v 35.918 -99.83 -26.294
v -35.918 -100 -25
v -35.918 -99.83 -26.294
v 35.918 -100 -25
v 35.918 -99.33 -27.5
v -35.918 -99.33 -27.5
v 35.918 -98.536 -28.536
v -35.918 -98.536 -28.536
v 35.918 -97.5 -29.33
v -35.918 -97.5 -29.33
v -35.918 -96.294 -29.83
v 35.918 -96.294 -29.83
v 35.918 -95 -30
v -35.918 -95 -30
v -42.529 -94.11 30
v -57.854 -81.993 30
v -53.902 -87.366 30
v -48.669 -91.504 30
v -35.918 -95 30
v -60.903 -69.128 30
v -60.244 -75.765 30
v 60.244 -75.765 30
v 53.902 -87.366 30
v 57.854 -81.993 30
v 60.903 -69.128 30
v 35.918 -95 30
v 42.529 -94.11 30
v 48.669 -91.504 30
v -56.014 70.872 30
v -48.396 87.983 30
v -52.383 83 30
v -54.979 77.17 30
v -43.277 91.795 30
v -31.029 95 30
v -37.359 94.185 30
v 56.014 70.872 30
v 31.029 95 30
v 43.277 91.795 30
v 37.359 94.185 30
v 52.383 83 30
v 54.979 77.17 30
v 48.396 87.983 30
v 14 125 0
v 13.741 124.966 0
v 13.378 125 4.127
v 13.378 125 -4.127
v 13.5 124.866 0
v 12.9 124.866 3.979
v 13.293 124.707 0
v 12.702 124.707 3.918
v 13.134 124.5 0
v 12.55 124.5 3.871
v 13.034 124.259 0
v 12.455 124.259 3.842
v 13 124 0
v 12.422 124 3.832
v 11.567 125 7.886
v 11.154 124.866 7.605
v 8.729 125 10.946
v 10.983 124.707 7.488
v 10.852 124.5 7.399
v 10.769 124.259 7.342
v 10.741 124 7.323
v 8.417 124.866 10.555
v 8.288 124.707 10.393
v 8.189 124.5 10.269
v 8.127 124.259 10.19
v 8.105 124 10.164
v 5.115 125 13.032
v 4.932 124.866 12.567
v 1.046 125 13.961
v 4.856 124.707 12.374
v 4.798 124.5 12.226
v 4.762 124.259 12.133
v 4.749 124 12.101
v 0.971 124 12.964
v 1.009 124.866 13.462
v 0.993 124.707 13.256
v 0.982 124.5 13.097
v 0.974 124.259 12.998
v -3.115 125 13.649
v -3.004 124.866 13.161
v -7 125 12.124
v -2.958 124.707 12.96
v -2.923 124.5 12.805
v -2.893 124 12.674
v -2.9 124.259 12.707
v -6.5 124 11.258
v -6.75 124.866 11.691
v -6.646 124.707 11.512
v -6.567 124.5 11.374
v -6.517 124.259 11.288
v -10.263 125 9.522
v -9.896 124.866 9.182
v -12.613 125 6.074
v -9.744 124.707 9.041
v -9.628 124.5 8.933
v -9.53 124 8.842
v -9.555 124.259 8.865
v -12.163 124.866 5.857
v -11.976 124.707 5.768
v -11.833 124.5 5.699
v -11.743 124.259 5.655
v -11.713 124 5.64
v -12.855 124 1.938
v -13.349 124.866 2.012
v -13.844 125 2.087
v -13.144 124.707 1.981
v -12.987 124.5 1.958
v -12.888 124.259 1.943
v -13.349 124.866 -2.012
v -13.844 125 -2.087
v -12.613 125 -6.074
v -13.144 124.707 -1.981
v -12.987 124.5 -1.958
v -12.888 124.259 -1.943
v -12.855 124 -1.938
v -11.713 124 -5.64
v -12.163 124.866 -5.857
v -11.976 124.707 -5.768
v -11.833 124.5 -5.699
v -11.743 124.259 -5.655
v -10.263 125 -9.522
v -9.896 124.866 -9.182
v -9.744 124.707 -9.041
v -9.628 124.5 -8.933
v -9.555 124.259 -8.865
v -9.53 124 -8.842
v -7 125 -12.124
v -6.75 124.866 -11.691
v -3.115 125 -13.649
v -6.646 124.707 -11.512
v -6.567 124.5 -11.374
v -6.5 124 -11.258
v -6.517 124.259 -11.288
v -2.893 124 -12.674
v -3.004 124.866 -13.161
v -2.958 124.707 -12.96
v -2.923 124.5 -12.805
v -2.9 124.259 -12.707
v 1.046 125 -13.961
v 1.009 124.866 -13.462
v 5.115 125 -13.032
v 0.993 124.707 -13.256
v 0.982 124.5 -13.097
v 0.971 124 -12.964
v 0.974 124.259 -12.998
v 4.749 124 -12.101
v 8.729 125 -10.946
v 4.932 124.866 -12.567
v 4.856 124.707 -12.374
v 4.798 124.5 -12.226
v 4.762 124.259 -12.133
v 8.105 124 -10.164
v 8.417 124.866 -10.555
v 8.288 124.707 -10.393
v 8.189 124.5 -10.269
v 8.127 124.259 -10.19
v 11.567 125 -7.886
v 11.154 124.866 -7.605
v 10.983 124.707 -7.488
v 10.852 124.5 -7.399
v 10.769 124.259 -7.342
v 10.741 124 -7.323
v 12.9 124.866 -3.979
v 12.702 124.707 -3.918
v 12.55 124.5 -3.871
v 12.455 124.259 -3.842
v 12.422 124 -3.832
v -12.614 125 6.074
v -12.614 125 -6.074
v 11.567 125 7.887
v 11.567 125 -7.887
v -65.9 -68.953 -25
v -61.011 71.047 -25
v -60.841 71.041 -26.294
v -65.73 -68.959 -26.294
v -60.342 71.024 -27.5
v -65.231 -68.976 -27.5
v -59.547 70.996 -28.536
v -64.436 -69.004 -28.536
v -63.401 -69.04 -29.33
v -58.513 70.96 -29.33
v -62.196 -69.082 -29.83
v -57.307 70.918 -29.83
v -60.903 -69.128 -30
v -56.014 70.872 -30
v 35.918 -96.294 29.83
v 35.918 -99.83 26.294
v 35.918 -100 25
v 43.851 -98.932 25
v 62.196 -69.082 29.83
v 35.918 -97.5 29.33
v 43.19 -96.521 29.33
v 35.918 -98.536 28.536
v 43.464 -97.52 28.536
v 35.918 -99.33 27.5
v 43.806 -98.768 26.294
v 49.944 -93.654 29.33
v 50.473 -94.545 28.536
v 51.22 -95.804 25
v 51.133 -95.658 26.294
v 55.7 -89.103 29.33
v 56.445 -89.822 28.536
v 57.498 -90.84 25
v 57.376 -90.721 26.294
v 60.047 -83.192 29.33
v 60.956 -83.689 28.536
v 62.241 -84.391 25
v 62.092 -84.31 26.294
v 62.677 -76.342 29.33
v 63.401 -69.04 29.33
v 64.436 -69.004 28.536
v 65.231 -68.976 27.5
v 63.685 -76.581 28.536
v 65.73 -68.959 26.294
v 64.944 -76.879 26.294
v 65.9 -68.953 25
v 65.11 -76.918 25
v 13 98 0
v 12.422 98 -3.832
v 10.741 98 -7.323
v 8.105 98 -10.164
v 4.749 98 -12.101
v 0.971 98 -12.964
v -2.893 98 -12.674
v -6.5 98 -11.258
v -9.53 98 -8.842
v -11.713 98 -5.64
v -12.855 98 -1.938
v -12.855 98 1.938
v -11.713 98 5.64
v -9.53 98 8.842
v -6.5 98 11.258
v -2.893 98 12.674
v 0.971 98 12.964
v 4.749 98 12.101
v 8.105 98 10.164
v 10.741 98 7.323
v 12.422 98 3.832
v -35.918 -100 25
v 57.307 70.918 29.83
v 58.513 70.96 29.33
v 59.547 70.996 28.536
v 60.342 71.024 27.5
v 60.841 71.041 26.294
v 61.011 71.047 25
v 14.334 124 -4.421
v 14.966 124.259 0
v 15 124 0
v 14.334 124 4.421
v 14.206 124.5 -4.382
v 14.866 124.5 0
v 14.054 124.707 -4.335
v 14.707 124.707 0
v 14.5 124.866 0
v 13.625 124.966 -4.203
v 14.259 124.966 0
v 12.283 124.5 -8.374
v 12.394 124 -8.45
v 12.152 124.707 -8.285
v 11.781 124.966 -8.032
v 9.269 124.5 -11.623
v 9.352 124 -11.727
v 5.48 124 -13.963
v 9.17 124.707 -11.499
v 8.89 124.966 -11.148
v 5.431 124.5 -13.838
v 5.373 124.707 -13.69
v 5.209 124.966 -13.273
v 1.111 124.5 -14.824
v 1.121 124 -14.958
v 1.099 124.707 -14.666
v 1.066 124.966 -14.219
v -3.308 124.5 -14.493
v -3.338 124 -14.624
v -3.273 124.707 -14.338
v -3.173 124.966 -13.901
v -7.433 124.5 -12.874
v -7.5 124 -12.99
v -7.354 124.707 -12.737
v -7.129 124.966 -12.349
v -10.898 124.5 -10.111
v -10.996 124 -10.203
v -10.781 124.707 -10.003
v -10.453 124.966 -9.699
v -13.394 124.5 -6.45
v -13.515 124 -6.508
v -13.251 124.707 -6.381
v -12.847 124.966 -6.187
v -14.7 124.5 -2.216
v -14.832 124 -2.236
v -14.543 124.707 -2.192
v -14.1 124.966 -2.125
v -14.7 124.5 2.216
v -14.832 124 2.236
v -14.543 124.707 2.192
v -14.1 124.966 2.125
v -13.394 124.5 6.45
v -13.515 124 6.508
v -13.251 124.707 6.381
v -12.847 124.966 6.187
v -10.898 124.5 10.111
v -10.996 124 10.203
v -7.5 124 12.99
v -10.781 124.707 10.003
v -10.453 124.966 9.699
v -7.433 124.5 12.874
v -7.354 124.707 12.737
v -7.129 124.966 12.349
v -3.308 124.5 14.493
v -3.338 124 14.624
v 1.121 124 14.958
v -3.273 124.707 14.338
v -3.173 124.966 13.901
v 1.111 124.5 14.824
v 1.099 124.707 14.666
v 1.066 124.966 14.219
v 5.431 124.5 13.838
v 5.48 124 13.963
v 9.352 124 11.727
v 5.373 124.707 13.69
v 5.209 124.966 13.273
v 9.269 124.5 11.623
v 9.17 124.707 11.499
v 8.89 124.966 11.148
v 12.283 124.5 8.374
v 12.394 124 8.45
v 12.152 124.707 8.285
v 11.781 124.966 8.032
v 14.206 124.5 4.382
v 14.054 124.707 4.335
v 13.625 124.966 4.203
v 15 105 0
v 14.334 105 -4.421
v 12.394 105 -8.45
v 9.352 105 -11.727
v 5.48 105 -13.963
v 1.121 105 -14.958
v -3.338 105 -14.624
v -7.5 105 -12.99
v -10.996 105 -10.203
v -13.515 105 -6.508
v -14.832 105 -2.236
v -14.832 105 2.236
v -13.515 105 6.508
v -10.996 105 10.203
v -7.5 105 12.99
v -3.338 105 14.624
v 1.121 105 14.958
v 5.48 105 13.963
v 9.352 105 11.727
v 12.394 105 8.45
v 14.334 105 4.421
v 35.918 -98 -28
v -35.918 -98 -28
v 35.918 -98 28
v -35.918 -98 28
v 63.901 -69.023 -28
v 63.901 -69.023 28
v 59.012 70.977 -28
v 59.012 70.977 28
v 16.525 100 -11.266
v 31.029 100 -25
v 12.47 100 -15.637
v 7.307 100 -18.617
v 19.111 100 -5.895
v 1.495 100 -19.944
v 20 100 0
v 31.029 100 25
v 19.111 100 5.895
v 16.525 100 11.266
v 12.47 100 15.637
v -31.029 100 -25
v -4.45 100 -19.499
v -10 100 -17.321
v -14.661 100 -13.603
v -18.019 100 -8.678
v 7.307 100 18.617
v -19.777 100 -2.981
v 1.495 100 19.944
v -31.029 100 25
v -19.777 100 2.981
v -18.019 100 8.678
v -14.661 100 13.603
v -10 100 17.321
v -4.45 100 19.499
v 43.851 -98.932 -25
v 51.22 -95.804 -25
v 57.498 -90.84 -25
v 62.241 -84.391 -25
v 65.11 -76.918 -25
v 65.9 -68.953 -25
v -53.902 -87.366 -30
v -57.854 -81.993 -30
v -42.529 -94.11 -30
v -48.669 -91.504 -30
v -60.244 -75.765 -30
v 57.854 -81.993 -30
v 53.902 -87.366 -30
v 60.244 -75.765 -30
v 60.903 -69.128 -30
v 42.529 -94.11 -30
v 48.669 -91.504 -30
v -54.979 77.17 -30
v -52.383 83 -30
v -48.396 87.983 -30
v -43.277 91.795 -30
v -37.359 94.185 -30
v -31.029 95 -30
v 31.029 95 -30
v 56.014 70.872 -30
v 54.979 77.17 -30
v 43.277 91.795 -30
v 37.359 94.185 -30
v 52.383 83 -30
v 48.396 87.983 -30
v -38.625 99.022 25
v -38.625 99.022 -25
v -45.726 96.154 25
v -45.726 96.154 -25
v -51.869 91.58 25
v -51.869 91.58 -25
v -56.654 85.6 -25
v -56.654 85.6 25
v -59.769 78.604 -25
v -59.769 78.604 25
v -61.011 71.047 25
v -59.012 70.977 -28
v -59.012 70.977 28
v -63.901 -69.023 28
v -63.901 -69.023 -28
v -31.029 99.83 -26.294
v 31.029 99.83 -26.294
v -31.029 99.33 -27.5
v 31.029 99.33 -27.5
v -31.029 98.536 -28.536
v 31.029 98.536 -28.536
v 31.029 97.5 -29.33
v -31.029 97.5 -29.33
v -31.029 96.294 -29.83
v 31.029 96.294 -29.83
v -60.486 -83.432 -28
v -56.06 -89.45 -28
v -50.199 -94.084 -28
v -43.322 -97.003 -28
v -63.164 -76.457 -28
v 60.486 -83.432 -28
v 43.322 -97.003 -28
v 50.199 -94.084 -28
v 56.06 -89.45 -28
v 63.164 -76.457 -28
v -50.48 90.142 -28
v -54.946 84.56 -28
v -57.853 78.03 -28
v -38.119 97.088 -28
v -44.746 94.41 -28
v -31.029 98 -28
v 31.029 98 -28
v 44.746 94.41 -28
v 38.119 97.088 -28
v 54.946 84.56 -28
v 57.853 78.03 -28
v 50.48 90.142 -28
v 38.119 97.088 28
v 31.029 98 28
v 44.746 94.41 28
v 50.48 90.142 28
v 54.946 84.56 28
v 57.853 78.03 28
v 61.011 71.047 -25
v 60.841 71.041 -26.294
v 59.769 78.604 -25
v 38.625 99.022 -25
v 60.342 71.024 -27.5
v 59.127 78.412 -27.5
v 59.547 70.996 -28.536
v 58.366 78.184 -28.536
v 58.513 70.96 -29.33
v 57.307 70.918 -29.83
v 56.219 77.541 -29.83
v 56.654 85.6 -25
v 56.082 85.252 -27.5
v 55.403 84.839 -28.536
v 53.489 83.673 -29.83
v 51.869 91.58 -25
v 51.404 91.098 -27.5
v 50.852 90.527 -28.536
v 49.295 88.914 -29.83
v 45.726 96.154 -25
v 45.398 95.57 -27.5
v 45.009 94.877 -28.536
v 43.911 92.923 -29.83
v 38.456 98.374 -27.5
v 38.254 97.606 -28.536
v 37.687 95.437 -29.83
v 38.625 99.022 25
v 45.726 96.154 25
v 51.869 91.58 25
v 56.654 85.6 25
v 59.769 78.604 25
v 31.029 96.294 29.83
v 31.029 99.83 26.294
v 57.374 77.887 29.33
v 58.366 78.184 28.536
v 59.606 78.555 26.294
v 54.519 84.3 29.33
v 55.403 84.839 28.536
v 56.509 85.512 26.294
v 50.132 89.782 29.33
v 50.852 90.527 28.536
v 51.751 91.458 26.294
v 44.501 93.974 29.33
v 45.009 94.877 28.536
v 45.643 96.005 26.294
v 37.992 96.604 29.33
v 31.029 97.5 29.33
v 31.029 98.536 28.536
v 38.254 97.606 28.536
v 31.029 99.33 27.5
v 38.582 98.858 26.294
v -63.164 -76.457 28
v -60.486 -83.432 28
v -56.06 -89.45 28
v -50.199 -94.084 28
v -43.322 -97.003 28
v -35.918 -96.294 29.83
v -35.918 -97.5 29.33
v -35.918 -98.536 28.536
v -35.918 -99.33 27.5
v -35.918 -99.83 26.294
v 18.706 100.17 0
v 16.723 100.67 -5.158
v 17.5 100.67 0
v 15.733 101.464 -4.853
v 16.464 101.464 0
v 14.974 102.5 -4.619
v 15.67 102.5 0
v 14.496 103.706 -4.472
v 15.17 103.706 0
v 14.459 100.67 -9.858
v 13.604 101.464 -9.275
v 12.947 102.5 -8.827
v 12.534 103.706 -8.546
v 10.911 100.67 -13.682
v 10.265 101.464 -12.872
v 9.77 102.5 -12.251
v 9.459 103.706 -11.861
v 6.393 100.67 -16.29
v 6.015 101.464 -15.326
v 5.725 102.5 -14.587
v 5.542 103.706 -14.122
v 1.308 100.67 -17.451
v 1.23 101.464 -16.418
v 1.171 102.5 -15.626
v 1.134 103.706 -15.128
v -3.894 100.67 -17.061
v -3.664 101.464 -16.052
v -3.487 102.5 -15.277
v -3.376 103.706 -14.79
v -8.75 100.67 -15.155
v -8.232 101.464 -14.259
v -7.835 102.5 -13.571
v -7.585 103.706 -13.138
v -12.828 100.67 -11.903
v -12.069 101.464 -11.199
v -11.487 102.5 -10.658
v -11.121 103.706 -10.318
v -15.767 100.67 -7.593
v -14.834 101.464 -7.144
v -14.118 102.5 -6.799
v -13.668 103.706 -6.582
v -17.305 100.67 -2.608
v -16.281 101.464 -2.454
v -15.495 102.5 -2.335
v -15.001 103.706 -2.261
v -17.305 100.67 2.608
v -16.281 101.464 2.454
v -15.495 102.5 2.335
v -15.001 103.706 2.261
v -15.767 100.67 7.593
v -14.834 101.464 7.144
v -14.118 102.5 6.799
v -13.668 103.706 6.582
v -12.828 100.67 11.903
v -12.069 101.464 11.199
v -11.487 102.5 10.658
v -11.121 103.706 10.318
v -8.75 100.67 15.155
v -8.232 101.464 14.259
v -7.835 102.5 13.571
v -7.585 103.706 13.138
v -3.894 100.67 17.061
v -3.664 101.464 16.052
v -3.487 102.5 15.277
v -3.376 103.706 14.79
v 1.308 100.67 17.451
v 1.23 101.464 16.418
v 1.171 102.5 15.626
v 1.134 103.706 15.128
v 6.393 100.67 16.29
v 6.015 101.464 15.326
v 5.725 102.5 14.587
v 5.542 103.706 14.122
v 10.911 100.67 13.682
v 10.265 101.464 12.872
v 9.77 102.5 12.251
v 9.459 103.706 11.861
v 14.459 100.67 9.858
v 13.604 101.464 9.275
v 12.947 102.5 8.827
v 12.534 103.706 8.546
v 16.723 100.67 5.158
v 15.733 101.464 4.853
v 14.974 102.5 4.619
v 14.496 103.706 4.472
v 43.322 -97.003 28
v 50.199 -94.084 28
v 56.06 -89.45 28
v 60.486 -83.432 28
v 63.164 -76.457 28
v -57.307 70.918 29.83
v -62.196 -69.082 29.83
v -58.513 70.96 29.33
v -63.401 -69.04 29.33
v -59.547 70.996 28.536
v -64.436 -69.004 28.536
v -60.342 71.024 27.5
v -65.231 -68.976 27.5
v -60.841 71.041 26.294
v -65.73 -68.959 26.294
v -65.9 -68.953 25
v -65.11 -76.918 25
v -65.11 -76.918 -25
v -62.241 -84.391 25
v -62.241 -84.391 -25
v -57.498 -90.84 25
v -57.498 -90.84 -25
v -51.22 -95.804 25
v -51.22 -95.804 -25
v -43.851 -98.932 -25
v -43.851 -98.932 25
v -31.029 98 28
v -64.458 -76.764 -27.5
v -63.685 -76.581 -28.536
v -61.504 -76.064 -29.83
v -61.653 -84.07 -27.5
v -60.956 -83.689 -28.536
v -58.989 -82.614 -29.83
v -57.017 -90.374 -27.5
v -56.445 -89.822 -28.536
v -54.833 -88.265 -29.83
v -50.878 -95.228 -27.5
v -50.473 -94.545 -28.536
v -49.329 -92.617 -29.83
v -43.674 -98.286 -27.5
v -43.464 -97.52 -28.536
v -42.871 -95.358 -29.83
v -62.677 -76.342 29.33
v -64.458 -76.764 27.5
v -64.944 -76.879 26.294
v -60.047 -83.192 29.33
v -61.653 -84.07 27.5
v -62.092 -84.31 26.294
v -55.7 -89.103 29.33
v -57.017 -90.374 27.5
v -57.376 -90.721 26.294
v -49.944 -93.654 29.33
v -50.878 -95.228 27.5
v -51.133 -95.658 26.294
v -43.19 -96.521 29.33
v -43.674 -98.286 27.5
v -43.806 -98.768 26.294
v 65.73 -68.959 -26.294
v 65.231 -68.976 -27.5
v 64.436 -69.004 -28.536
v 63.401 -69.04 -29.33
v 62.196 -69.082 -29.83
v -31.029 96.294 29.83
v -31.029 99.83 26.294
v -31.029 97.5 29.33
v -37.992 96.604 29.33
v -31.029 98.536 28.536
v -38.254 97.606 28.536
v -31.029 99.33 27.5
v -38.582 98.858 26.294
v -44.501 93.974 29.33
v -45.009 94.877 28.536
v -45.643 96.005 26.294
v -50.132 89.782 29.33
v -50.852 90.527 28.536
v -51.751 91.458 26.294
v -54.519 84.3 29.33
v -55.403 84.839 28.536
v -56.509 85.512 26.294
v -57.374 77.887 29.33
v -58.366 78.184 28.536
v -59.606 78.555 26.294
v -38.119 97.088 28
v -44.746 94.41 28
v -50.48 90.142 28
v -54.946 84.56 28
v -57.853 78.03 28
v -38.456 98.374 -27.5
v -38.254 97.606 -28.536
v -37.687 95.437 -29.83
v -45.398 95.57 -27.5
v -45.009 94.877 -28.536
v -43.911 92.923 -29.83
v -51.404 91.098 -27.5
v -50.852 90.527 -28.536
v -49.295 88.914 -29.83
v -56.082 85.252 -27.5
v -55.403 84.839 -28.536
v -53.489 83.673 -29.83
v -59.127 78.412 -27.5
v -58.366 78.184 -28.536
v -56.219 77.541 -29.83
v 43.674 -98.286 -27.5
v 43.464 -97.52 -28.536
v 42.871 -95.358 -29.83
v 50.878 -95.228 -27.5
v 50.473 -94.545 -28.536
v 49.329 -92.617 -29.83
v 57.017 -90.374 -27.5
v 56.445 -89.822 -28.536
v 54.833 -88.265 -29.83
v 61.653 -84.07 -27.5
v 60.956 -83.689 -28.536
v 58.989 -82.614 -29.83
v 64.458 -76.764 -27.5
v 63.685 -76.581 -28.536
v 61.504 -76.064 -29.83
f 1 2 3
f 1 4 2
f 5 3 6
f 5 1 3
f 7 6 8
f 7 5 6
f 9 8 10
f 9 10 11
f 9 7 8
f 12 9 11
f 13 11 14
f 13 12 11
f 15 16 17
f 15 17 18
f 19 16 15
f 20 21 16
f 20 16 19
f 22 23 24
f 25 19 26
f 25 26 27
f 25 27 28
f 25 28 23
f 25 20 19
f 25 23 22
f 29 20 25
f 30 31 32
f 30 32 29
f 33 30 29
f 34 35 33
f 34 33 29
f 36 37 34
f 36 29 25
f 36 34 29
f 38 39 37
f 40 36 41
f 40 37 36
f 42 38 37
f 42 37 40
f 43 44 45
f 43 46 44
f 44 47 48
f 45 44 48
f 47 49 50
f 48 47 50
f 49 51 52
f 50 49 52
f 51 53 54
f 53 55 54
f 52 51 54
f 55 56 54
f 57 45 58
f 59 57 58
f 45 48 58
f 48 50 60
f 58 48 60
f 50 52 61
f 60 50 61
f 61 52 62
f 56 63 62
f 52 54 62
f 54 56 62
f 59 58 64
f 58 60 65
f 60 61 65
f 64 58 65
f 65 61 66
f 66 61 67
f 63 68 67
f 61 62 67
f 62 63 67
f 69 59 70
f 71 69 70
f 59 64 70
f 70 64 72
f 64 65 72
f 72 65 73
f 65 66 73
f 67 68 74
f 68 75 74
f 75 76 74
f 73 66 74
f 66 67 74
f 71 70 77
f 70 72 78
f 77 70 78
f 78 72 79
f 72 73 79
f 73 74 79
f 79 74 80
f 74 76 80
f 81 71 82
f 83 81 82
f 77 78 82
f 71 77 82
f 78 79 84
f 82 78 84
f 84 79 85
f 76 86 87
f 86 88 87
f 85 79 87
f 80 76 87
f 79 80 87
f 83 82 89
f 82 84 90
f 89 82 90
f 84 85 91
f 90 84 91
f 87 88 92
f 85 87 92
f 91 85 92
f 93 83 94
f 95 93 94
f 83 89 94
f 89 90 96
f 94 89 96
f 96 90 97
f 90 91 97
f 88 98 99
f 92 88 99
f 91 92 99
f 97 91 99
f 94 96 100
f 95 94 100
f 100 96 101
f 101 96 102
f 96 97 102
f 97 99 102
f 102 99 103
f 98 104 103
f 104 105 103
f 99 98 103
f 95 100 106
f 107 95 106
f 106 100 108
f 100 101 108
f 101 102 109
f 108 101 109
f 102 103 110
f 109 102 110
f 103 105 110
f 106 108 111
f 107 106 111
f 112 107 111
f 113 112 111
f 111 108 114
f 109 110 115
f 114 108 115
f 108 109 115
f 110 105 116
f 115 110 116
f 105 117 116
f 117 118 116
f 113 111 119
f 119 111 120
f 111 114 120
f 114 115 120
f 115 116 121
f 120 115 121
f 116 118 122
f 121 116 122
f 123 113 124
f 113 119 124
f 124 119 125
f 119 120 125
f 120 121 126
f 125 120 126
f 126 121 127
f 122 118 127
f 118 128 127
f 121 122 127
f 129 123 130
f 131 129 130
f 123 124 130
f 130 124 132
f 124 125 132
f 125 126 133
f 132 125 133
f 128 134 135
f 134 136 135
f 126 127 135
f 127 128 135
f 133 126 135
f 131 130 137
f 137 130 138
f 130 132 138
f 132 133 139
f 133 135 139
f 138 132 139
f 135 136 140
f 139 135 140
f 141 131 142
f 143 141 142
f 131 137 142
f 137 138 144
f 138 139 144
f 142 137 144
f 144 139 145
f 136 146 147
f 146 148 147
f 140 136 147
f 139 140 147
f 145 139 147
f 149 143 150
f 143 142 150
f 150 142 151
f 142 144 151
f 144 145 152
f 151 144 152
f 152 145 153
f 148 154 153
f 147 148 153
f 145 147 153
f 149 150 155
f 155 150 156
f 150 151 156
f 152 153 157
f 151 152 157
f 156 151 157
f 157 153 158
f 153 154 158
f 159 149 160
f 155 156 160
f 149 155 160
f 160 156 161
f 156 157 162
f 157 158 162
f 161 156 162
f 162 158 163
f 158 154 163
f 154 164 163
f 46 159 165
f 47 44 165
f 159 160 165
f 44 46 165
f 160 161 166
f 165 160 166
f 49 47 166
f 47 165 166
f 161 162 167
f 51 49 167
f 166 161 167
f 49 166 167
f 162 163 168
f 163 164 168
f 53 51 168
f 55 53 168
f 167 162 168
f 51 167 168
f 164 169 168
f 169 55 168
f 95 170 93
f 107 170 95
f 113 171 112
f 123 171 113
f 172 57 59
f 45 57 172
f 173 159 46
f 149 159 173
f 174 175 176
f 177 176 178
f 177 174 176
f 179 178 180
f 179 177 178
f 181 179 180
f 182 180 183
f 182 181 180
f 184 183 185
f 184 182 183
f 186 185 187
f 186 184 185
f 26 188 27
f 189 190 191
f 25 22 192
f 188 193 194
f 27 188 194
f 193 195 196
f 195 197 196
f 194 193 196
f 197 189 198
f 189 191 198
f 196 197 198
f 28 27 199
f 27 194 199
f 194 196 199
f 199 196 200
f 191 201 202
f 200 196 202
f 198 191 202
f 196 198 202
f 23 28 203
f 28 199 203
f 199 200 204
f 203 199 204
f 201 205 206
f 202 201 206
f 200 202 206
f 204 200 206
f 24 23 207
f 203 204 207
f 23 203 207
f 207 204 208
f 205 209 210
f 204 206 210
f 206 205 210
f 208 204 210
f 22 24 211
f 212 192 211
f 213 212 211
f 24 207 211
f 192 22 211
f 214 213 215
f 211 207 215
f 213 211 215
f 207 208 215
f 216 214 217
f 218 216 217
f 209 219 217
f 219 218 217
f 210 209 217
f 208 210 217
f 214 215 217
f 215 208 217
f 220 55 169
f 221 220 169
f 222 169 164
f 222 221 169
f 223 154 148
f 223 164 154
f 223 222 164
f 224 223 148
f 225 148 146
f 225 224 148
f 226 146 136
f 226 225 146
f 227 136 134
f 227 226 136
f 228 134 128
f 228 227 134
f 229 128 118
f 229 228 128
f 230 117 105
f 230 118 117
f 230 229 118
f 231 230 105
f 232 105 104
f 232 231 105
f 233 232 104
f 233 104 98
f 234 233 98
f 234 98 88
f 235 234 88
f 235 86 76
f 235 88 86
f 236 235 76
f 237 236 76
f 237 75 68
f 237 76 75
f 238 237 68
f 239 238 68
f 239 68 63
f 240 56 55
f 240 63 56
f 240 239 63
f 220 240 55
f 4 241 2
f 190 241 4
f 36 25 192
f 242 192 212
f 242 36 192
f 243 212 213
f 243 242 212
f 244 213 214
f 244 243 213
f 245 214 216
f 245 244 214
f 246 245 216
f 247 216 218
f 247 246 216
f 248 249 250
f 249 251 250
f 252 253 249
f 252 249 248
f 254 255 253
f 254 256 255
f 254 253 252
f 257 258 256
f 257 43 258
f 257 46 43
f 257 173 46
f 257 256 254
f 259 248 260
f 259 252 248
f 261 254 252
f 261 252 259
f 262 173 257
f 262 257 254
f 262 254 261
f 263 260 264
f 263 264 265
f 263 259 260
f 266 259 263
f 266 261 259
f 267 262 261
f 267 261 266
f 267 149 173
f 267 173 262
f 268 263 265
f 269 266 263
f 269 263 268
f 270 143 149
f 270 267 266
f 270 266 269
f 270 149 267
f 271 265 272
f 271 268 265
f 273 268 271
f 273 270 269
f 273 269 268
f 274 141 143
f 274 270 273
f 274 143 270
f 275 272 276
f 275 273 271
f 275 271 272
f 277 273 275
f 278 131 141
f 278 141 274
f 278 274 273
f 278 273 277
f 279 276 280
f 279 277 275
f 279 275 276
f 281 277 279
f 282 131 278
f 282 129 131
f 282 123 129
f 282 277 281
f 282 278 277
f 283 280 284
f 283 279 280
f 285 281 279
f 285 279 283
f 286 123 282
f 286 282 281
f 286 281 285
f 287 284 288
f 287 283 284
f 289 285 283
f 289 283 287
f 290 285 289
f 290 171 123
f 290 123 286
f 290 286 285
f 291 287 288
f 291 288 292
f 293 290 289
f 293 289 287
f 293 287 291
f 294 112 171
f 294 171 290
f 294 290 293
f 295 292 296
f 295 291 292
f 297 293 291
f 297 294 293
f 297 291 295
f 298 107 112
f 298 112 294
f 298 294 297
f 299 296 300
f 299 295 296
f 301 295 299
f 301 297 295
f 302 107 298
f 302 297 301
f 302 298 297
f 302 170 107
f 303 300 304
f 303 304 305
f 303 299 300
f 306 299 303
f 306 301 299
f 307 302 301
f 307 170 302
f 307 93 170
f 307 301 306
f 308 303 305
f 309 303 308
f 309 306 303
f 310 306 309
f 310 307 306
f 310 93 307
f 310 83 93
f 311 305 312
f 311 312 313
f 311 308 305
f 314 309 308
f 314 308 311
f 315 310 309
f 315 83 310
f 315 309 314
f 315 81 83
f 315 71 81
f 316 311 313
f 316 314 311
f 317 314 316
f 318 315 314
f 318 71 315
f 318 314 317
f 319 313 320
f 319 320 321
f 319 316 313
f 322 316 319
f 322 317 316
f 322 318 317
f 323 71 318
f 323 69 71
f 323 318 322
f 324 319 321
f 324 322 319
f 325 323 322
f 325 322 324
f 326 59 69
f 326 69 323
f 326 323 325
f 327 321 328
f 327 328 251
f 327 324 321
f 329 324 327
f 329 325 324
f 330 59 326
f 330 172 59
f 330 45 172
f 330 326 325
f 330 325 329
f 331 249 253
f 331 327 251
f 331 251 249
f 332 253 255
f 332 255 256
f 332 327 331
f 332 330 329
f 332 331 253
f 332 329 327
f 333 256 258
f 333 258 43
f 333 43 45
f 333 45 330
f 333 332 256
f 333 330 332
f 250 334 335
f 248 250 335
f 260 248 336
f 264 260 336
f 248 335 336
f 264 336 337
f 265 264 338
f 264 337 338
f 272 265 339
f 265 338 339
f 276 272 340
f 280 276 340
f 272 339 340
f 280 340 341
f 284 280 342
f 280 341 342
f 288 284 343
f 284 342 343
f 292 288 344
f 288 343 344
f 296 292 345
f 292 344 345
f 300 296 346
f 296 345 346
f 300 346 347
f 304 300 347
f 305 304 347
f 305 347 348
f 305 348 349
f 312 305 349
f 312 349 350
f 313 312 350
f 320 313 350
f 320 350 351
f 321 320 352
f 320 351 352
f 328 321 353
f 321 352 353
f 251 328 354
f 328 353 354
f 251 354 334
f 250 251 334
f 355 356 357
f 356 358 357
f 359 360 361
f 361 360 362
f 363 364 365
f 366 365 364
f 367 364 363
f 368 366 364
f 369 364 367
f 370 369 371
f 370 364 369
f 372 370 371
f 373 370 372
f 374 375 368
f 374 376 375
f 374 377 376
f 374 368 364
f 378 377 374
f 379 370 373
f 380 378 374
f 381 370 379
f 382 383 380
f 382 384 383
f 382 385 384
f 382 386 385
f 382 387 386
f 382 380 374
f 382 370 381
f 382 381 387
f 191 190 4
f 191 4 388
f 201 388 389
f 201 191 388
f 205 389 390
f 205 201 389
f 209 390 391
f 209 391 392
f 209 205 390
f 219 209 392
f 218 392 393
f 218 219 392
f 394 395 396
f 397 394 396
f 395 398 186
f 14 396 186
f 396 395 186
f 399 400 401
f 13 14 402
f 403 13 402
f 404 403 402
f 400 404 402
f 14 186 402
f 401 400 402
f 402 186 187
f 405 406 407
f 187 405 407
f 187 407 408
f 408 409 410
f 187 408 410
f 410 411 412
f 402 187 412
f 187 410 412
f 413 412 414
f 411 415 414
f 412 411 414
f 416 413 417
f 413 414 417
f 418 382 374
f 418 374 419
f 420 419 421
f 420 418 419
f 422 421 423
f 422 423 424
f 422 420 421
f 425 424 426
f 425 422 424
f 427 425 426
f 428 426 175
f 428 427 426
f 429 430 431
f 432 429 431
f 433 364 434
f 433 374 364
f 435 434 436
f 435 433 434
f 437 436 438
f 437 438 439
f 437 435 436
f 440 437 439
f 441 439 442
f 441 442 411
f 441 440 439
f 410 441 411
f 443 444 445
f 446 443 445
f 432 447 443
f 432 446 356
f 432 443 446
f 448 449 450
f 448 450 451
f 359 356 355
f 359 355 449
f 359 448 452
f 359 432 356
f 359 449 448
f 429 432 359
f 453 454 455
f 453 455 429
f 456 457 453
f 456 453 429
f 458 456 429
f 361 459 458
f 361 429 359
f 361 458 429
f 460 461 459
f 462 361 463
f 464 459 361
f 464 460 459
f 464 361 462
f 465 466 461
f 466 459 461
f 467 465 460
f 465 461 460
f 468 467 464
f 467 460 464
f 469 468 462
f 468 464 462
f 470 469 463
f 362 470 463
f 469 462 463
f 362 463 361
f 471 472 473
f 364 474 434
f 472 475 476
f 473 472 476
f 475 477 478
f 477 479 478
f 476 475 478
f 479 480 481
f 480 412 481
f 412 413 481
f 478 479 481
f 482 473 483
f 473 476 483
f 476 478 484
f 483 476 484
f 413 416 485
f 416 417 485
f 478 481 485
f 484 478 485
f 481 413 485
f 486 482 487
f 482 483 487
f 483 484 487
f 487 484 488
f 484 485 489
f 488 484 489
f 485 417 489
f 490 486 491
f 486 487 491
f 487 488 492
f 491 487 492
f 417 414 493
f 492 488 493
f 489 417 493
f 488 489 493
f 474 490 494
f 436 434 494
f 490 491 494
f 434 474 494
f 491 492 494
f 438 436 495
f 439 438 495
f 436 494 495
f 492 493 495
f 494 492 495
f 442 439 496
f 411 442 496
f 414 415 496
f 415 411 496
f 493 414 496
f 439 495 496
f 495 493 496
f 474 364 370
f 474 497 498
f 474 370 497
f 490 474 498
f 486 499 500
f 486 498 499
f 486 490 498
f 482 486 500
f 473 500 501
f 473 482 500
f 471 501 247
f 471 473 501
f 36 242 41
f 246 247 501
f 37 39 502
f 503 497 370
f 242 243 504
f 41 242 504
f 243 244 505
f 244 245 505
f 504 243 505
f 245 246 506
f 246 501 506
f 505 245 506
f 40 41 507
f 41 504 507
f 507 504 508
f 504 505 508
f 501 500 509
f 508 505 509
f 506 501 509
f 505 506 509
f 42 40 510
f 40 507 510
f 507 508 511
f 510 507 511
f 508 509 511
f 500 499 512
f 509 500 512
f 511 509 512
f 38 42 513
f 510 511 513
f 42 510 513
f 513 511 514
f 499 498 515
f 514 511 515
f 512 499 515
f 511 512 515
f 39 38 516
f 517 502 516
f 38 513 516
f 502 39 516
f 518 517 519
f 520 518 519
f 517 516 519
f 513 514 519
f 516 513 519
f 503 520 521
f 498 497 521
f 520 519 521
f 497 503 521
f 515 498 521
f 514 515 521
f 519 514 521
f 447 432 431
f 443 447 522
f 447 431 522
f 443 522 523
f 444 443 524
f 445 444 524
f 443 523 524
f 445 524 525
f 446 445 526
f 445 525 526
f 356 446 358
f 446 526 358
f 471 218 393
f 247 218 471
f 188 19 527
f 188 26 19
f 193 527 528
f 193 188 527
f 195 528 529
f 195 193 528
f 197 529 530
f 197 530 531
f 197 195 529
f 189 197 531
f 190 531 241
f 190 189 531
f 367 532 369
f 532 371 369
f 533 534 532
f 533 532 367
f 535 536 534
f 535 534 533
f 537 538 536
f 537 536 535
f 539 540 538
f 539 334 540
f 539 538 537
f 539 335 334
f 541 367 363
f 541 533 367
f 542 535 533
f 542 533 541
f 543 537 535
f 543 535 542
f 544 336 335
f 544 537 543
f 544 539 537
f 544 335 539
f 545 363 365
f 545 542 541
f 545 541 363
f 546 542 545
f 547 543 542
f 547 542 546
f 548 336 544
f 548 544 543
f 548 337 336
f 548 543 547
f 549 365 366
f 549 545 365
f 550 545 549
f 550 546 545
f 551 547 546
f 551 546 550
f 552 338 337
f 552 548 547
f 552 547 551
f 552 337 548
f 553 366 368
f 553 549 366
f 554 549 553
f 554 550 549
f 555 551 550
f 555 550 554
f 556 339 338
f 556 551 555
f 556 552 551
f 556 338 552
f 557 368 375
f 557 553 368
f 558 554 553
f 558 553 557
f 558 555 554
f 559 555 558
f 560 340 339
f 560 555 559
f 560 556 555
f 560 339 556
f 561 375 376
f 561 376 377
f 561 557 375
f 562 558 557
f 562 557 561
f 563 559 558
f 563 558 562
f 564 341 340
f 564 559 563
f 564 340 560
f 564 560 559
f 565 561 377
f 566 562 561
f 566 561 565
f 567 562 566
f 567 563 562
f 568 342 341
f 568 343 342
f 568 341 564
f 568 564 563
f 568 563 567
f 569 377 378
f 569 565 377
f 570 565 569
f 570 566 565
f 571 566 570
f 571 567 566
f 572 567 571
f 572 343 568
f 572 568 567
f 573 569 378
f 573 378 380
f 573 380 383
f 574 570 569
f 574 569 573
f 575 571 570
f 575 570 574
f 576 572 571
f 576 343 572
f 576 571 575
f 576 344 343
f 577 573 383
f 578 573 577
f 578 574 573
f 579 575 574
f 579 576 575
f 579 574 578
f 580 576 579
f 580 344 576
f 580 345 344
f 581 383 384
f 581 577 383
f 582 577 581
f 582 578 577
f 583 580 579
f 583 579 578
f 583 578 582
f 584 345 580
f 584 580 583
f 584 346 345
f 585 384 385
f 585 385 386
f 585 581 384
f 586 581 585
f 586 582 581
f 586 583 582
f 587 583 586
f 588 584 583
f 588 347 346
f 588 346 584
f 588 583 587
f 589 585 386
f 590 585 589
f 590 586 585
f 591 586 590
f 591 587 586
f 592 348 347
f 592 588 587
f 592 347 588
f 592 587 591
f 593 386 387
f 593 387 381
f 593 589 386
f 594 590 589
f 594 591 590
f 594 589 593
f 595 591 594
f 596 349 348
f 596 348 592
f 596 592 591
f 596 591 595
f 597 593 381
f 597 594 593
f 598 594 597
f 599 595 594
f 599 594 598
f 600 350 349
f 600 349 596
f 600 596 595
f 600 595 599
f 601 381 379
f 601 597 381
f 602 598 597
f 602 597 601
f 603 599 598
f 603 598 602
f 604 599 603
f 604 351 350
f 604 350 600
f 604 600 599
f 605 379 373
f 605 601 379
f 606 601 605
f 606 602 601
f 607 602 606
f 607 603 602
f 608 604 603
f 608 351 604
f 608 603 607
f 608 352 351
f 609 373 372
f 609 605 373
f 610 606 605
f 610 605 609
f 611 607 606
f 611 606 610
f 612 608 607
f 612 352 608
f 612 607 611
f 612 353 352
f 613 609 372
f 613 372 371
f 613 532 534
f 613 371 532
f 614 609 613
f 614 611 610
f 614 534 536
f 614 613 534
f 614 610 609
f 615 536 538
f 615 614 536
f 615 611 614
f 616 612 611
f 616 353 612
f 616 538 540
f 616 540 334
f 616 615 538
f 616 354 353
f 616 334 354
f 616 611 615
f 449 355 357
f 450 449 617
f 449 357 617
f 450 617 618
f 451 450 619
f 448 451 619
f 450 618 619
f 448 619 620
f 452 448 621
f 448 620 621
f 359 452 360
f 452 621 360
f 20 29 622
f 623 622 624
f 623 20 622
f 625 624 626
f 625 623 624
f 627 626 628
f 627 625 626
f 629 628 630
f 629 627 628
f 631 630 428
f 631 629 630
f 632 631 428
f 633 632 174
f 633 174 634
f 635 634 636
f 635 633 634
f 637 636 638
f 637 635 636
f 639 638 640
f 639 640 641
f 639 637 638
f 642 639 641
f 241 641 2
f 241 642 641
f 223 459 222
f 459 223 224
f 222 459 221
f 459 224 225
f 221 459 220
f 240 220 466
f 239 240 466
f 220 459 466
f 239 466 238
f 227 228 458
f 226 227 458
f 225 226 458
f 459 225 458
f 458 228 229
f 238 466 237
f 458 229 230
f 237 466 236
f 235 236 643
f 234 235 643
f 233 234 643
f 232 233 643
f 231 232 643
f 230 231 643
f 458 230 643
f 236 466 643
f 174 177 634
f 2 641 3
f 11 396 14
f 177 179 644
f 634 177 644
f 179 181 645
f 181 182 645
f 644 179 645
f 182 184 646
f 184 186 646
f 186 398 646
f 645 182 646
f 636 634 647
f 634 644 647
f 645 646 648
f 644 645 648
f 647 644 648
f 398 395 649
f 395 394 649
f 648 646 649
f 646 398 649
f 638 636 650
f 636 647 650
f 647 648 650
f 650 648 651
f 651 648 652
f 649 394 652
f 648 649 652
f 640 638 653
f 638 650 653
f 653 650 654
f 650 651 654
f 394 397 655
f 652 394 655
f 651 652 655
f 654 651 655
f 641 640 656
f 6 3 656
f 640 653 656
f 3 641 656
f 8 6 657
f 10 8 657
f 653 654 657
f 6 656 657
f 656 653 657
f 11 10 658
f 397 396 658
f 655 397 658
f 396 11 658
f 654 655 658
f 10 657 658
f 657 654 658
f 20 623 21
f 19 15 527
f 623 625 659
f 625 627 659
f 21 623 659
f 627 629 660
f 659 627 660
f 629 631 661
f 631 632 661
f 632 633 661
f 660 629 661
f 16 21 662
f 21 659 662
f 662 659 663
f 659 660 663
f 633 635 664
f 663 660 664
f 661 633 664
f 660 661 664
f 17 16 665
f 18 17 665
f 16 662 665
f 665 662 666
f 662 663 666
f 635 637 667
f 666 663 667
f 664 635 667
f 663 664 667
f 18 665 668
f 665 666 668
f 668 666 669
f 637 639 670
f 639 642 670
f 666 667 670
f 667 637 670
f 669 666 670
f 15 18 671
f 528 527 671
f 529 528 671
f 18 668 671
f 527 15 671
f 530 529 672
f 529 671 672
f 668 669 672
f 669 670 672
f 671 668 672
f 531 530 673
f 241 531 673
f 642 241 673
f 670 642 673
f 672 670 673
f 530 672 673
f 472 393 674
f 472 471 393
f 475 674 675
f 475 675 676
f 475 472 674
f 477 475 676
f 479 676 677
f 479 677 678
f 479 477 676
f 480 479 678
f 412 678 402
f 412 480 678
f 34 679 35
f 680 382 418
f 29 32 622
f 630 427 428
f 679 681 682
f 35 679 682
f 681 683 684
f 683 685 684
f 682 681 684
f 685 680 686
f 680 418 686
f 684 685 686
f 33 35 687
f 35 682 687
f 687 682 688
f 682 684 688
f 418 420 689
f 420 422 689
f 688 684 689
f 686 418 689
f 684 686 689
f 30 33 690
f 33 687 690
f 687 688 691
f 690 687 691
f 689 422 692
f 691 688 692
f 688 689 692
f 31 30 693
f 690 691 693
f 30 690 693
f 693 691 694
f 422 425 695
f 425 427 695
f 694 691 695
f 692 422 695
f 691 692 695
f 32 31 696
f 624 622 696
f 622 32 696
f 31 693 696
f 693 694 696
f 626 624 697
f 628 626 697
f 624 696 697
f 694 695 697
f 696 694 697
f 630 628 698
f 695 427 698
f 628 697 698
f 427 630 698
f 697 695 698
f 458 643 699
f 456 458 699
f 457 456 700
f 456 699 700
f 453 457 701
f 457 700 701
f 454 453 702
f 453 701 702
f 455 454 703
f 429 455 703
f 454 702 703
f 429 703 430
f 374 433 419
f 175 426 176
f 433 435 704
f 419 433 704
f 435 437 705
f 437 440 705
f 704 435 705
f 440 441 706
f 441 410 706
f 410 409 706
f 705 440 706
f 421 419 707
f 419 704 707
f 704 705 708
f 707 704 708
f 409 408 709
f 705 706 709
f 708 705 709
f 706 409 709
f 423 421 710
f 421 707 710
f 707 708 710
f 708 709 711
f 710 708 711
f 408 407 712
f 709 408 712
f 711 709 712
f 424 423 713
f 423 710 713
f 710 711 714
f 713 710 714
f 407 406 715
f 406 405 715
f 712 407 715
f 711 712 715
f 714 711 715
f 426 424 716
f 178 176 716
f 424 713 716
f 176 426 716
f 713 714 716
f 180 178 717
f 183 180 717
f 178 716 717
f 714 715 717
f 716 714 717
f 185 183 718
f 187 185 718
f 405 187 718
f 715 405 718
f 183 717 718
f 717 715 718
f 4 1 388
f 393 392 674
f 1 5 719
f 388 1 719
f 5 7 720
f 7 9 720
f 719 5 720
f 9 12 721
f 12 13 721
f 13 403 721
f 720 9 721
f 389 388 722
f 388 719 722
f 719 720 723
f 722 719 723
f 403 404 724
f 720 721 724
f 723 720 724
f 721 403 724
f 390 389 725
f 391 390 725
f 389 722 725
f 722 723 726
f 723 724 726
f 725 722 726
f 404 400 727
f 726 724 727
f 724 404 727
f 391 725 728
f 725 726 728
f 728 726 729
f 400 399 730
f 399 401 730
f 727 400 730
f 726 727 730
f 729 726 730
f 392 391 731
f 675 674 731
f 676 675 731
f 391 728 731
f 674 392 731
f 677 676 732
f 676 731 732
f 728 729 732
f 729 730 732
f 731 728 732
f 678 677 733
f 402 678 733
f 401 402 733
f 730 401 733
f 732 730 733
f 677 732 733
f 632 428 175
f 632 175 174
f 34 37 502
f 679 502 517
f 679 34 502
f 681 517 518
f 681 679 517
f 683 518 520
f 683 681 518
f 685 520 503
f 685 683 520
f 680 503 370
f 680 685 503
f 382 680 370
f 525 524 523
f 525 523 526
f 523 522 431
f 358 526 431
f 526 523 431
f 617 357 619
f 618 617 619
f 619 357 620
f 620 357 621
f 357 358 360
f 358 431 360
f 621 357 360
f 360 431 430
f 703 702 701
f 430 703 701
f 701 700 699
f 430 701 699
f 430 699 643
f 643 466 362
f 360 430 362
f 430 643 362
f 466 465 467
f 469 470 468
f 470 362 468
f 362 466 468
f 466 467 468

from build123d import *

# Parameters (mm, degrees)
EXTRUDE_1_DEPTH = 30
FILLET_1_R      = 30
SKETCH_2_R      = 15
EXTRUDE_2_DEPTH = 25
SHELL_1_T       = -2
FILLET_3_R      = 5
FILLET_4_R      = 1


with BuildPart() as part:
    # 草图1 → 凸台-拉伸1 (new, symmetric)
    with BuildSketch(Plane.XY):
        with BuildLine():
            Line((60, 100), (-60, 100))
            Line((-60, 100), (-65.899969295, -68.953015099))
            ThreePointArc((-65.899969295, -68.953015099), (-57.498438495, -90.839751114), (-35.918244485, -100))
            Line((-35.918244485, -100), (35.918244485, -100))
            ThreePointArc((35.918244485, -100), (57.498438495, -90.839751114), (65.899969295, -68.953015099))
            Line((65.899969295, -68.953015099), (60, 100))
        make_face()
    extrude(amount=EXTRUDE_1_DEPTH, both=True)

    # 圆角1
    fillet_1_edges = [part.edges().sort_by_distance(p)[0] for p in [
        (-60, 100, 0),
        (60, 100, 0),
    ]]
    fillet(fillet_1_edges, radius=FILLET_1_R)

    # 草图2 → 凸台-拉伸2 (add)
    with BuildSketch(Plane(origin=(0, 100, 0), x_dir=(1, 0, 0), z_dir=(0, 1, 0))):
        Circle(SKETCH_2_R)
    extrude(amount=EXTRUDE_2_DEPTH)

    # 抽壳1
    shell_1_openings = [part.faces().sort_by_distance(p)[0] for p in [
        (0, 125, 0),
    ]]
    offset(amount=SHELL_1_T, openings=shell_1_openings, kind=Kind.INTERSECTION)

    # 圆角3
    fillet_3_edges = [part.edges().sort_by_distance(p)[0] for p in [
        (0, -100, 30),
        (57.498438495, -90.839751114, 30),
        (0, 100, -30),
        (0, 100, 30),
        (63.455515431, 1.046984901, 30),
        (-63.455515431, 1.046984901, -30),
        (-51.86908787, 91.58019401, -30),
        (51.86908787, 91.58019401, -30),
        (-63.455515431, 1.046984901, 30),
        (-51.86908787, 91.58019401, 30),
        (51.86908787, 91.58019401, 30),
        (-15, 100, 0),
        (63.455515431, 1.046984901, -30),
        (57.498438495, -90.839751114, -30),
        (0, -100, -30),
        (-57.498438495, -90.839751114, -30),
        (-57.498438495, -90.839751114, 30),
    ]]
    fillet(fillet_3_edges, radius=FILLET_3_R)

    # 圆角4
    fillet_4_edges = [part.edges().sort_by_distance(p)[0] for p in [
        (-15, 125, 0),
        (-13, 125, 0),
    ]]
    fillet(fillet_4_edges, radius=FILLET_4_R - 0.0001)  # a hair under: the kernel refuses the full size


solid = part.part
